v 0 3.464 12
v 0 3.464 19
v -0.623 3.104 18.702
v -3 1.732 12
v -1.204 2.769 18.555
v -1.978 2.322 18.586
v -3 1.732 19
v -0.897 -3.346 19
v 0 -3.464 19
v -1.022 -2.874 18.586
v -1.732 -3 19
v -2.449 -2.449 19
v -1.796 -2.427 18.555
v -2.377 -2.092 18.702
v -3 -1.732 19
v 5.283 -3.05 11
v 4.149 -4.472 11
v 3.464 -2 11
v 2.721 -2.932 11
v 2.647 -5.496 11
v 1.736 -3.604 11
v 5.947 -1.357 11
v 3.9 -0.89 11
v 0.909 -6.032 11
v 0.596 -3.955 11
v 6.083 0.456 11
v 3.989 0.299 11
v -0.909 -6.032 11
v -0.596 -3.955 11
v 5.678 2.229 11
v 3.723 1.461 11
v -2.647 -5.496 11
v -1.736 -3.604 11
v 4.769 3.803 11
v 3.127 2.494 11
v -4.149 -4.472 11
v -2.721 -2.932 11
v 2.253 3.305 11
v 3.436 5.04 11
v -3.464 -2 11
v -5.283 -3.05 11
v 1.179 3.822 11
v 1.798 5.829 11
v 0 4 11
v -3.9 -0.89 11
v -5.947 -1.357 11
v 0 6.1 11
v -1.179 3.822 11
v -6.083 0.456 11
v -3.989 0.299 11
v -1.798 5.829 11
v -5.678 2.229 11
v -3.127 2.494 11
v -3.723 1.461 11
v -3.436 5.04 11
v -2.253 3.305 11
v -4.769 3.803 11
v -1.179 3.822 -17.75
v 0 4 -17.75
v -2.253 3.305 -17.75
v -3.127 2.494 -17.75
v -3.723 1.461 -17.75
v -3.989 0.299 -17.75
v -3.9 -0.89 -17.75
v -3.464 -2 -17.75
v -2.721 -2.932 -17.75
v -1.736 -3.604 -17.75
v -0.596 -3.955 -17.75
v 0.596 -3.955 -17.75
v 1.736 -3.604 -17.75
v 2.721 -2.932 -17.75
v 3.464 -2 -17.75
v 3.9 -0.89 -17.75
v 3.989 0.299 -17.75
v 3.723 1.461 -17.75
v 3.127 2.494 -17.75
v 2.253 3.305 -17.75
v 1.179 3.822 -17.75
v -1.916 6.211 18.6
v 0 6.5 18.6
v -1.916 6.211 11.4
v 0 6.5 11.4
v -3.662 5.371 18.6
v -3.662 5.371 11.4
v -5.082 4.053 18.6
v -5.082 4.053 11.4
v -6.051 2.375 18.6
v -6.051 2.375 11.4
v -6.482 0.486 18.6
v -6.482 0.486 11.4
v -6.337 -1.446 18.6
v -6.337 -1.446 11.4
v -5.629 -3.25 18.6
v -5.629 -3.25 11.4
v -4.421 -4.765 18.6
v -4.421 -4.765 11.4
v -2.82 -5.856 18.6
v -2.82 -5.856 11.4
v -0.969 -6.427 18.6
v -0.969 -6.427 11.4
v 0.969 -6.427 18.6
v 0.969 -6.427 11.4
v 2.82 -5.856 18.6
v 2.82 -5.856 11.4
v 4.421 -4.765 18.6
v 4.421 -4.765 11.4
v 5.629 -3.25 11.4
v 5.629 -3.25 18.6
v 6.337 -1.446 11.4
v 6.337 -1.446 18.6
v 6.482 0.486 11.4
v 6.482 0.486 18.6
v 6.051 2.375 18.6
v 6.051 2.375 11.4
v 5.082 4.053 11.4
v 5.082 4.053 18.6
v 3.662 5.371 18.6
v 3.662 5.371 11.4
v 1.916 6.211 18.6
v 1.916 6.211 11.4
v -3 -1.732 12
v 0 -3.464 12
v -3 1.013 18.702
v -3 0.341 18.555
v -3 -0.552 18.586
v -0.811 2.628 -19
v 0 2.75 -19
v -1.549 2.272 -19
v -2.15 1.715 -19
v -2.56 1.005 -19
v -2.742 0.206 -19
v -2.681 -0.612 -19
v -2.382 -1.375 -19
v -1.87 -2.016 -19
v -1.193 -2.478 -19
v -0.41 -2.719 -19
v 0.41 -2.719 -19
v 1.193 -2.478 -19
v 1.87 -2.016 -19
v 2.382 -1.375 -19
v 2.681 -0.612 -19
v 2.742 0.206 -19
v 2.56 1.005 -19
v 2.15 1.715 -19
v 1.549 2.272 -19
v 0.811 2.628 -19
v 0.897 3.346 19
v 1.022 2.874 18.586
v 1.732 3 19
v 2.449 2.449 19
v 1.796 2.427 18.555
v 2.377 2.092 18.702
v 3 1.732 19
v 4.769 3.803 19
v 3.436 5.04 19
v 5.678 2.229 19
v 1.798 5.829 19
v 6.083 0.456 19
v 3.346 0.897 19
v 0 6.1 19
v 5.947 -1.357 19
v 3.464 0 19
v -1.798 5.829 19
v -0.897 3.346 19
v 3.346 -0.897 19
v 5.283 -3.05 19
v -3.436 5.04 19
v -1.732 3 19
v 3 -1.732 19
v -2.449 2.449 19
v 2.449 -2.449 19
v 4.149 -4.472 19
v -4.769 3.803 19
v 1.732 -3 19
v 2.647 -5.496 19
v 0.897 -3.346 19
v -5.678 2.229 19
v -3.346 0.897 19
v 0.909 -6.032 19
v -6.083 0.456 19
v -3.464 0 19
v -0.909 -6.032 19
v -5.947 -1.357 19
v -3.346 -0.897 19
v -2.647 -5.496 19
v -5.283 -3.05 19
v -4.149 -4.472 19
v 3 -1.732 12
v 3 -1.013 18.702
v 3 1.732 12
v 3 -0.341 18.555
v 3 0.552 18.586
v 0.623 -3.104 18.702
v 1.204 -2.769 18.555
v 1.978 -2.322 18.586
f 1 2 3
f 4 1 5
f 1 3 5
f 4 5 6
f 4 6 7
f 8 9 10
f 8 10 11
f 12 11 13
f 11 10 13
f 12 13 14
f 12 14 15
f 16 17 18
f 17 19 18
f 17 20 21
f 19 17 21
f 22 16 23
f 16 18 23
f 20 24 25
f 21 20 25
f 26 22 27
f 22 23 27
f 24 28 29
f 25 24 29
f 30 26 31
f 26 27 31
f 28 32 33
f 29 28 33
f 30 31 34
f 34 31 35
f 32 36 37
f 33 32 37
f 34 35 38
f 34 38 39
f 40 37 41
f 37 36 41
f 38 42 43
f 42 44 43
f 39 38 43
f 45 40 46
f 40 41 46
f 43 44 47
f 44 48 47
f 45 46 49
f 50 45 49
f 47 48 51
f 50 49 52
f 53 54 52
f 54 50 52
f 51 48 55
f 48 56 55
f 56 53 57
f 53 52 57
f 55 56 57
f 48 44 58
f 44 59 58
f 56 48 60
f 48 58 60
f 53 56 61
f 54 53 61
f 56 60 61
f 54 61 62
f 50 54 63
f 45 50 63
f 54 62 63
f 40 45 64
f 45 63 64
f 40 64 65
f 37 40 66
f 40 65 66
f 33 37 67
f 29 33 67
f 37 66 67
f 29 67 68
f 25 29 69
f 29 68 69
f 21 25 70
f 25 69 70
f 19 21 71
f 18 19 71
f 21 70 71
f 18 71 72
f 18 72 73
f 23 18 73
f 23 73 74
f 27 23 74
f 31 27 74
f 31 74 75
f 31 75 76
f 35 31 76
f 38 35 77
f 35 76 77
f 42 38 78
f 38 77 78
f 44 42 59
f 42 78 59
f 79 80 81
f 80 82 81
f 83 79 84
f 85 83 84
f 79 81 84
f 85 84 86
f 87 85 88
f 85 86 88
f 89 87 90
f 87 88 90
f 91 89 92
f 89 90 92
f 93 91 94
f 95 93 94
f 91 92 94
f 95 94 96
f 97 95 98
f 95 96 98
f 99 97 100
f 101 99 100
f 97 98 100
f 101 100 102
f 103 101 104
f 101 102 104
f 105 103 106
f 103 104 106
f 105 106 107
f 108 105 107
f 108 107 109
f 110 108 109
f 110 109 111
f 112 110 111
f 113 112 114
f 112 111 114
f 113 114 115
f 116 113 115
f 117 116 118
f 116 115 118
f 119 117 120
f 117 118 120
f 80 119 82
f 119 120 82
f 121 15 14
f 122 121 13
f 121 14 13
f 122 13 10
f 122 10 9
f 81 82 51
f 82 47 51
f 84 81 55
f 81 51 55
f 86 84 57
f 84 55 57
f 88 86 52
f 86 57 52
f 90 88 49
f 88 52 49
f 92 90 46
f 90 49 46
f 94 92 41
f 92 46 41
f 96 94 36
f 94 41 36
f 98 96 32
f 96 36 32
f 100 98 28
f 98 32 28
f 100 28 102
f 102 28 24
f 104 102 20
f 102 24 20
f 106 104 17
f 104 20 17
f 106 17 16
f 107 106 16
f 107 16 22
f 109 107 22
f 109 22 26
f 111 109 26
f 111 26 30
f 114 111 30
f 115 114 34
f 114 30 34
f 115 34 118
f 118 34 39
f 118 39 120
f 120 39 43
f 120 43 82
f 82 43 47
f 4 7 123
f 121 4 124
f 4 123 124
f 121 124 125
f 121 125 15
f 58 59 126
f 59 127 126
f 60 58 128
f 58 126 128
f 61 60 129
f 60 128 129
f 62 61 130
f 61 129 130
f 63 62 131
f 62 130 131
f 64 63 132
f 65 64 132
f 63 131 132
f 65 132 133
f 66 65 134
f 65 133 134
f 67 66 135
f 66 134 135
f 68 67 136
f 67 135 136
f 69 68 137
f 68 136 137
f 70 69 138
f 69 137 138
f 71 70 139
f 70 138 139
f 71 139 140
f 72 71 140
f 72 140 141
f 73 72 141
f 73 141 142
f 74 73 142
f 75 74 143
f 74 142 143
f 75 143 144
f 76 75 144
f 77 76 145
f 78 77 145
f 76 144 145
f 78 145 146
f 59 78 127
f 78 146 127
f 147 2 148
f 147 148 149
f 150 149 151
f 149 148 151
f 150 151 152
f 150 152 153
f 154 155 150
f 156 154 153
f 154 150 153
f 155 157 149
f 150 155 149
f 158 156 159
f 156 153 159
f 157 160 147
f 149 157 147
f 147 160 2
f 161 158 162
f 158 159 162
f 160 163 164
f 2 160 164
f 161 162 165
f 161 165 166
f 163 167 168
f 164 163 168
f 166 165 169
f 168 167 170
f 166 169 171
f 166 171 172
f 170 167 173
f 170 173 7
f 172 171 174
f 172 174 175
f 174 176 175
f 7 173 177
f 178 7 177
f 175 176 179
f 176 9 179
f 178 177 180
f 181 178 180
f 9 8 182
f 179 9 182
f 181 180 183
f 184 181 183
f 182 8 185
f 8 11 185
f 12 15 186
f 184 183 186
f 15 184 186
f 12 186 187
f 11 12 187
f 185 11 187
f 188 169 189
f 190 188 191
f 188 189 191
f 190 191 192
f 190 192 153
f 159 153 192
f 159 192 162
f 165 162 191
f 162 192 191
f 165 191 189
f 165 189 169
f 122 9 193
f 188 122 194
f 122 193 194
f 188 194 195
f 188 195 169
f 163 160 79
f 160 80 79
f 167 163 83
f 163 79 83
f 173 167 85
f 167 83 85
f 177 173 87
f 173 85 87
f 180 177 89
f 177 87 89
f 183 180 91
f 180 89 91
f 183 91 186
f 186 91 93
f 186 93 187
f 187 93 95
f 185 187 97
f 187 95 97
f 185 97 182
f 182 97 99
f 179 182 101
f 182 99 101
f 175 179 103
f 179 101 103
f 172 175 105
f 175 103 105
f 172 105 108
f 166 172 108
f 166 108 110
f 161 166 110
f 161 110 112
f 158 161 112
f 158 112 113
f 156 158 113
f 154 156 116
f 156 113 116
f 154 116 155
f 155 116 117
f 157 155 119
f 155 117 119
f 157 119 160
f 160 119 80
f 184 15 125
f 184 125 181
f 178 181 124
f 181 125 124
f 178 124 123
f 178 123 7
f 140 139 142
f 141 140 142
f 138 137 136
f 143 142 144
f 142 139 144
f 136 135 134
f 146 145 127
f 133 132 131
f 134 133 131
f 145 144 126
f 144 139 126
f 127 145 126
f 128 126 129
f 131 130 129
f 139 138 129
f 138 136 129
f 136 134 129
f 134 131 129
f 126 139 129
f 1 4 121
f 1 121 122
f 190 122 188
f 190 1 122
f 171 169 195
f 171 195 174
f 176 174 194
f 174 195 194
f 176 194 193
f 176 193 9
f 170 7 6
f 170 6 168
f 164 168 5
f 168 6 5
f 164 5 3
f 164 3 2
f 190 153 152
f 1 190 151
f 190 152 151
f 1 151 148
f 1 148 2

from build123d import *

# Parameters (mm, degrees)
CUT_EXTRUDE1_DEPTH = 7


with BuildPart() as part:
    # Sketch2 → Revolve1 (revolve)
    with BuildSketch(Plane(origin=(0, 0, 0), x_dir=(0, 0, -1), z_dir=(1, 0, 0))):
        Polygon((-19, 0), (-19, 6.1), (-18.6, 6.5), (-11.4, 6.5), (-11, 6.1), (-11, 4), (17.75, 4), (19, 2.75), (19, 0), align=None)
    revolve(axis=Axis((0, 0, -19), (0, 0, 1)))

    # Sketch3 → Cut-Extrude1 (cut)
    with BuildSketch(Plane.XY.offset(19)):
        Polygon((3, -1.732050808), (3, 1.732050808), (0, 3.464101615), (-3, 1.732050808), (-3, -1.732050808), (0, -3.464101615), align=None)
    extrude(amount=-CUT_EXTRUDE1_DEPTH, mode=Mode.SUBTRACT)

    # Cut-Extrude2 cone 1 section (through the dimple's axis) → Cut-Extrude2 (revolve, cut)
    with BuildSketch(Plane(origin=(0, 0, 19), x_dir=(0, -1, 0), z_dir=(1, 0, 0))):
        Polygon((0, 0), (3.464101615, 0), (0, 3.464101615), align=None)
    revolve(axis=Axis((0, 0, 19), (0, 0, -1)), mode=Mode.SUBTRACT)


solid = part.part
